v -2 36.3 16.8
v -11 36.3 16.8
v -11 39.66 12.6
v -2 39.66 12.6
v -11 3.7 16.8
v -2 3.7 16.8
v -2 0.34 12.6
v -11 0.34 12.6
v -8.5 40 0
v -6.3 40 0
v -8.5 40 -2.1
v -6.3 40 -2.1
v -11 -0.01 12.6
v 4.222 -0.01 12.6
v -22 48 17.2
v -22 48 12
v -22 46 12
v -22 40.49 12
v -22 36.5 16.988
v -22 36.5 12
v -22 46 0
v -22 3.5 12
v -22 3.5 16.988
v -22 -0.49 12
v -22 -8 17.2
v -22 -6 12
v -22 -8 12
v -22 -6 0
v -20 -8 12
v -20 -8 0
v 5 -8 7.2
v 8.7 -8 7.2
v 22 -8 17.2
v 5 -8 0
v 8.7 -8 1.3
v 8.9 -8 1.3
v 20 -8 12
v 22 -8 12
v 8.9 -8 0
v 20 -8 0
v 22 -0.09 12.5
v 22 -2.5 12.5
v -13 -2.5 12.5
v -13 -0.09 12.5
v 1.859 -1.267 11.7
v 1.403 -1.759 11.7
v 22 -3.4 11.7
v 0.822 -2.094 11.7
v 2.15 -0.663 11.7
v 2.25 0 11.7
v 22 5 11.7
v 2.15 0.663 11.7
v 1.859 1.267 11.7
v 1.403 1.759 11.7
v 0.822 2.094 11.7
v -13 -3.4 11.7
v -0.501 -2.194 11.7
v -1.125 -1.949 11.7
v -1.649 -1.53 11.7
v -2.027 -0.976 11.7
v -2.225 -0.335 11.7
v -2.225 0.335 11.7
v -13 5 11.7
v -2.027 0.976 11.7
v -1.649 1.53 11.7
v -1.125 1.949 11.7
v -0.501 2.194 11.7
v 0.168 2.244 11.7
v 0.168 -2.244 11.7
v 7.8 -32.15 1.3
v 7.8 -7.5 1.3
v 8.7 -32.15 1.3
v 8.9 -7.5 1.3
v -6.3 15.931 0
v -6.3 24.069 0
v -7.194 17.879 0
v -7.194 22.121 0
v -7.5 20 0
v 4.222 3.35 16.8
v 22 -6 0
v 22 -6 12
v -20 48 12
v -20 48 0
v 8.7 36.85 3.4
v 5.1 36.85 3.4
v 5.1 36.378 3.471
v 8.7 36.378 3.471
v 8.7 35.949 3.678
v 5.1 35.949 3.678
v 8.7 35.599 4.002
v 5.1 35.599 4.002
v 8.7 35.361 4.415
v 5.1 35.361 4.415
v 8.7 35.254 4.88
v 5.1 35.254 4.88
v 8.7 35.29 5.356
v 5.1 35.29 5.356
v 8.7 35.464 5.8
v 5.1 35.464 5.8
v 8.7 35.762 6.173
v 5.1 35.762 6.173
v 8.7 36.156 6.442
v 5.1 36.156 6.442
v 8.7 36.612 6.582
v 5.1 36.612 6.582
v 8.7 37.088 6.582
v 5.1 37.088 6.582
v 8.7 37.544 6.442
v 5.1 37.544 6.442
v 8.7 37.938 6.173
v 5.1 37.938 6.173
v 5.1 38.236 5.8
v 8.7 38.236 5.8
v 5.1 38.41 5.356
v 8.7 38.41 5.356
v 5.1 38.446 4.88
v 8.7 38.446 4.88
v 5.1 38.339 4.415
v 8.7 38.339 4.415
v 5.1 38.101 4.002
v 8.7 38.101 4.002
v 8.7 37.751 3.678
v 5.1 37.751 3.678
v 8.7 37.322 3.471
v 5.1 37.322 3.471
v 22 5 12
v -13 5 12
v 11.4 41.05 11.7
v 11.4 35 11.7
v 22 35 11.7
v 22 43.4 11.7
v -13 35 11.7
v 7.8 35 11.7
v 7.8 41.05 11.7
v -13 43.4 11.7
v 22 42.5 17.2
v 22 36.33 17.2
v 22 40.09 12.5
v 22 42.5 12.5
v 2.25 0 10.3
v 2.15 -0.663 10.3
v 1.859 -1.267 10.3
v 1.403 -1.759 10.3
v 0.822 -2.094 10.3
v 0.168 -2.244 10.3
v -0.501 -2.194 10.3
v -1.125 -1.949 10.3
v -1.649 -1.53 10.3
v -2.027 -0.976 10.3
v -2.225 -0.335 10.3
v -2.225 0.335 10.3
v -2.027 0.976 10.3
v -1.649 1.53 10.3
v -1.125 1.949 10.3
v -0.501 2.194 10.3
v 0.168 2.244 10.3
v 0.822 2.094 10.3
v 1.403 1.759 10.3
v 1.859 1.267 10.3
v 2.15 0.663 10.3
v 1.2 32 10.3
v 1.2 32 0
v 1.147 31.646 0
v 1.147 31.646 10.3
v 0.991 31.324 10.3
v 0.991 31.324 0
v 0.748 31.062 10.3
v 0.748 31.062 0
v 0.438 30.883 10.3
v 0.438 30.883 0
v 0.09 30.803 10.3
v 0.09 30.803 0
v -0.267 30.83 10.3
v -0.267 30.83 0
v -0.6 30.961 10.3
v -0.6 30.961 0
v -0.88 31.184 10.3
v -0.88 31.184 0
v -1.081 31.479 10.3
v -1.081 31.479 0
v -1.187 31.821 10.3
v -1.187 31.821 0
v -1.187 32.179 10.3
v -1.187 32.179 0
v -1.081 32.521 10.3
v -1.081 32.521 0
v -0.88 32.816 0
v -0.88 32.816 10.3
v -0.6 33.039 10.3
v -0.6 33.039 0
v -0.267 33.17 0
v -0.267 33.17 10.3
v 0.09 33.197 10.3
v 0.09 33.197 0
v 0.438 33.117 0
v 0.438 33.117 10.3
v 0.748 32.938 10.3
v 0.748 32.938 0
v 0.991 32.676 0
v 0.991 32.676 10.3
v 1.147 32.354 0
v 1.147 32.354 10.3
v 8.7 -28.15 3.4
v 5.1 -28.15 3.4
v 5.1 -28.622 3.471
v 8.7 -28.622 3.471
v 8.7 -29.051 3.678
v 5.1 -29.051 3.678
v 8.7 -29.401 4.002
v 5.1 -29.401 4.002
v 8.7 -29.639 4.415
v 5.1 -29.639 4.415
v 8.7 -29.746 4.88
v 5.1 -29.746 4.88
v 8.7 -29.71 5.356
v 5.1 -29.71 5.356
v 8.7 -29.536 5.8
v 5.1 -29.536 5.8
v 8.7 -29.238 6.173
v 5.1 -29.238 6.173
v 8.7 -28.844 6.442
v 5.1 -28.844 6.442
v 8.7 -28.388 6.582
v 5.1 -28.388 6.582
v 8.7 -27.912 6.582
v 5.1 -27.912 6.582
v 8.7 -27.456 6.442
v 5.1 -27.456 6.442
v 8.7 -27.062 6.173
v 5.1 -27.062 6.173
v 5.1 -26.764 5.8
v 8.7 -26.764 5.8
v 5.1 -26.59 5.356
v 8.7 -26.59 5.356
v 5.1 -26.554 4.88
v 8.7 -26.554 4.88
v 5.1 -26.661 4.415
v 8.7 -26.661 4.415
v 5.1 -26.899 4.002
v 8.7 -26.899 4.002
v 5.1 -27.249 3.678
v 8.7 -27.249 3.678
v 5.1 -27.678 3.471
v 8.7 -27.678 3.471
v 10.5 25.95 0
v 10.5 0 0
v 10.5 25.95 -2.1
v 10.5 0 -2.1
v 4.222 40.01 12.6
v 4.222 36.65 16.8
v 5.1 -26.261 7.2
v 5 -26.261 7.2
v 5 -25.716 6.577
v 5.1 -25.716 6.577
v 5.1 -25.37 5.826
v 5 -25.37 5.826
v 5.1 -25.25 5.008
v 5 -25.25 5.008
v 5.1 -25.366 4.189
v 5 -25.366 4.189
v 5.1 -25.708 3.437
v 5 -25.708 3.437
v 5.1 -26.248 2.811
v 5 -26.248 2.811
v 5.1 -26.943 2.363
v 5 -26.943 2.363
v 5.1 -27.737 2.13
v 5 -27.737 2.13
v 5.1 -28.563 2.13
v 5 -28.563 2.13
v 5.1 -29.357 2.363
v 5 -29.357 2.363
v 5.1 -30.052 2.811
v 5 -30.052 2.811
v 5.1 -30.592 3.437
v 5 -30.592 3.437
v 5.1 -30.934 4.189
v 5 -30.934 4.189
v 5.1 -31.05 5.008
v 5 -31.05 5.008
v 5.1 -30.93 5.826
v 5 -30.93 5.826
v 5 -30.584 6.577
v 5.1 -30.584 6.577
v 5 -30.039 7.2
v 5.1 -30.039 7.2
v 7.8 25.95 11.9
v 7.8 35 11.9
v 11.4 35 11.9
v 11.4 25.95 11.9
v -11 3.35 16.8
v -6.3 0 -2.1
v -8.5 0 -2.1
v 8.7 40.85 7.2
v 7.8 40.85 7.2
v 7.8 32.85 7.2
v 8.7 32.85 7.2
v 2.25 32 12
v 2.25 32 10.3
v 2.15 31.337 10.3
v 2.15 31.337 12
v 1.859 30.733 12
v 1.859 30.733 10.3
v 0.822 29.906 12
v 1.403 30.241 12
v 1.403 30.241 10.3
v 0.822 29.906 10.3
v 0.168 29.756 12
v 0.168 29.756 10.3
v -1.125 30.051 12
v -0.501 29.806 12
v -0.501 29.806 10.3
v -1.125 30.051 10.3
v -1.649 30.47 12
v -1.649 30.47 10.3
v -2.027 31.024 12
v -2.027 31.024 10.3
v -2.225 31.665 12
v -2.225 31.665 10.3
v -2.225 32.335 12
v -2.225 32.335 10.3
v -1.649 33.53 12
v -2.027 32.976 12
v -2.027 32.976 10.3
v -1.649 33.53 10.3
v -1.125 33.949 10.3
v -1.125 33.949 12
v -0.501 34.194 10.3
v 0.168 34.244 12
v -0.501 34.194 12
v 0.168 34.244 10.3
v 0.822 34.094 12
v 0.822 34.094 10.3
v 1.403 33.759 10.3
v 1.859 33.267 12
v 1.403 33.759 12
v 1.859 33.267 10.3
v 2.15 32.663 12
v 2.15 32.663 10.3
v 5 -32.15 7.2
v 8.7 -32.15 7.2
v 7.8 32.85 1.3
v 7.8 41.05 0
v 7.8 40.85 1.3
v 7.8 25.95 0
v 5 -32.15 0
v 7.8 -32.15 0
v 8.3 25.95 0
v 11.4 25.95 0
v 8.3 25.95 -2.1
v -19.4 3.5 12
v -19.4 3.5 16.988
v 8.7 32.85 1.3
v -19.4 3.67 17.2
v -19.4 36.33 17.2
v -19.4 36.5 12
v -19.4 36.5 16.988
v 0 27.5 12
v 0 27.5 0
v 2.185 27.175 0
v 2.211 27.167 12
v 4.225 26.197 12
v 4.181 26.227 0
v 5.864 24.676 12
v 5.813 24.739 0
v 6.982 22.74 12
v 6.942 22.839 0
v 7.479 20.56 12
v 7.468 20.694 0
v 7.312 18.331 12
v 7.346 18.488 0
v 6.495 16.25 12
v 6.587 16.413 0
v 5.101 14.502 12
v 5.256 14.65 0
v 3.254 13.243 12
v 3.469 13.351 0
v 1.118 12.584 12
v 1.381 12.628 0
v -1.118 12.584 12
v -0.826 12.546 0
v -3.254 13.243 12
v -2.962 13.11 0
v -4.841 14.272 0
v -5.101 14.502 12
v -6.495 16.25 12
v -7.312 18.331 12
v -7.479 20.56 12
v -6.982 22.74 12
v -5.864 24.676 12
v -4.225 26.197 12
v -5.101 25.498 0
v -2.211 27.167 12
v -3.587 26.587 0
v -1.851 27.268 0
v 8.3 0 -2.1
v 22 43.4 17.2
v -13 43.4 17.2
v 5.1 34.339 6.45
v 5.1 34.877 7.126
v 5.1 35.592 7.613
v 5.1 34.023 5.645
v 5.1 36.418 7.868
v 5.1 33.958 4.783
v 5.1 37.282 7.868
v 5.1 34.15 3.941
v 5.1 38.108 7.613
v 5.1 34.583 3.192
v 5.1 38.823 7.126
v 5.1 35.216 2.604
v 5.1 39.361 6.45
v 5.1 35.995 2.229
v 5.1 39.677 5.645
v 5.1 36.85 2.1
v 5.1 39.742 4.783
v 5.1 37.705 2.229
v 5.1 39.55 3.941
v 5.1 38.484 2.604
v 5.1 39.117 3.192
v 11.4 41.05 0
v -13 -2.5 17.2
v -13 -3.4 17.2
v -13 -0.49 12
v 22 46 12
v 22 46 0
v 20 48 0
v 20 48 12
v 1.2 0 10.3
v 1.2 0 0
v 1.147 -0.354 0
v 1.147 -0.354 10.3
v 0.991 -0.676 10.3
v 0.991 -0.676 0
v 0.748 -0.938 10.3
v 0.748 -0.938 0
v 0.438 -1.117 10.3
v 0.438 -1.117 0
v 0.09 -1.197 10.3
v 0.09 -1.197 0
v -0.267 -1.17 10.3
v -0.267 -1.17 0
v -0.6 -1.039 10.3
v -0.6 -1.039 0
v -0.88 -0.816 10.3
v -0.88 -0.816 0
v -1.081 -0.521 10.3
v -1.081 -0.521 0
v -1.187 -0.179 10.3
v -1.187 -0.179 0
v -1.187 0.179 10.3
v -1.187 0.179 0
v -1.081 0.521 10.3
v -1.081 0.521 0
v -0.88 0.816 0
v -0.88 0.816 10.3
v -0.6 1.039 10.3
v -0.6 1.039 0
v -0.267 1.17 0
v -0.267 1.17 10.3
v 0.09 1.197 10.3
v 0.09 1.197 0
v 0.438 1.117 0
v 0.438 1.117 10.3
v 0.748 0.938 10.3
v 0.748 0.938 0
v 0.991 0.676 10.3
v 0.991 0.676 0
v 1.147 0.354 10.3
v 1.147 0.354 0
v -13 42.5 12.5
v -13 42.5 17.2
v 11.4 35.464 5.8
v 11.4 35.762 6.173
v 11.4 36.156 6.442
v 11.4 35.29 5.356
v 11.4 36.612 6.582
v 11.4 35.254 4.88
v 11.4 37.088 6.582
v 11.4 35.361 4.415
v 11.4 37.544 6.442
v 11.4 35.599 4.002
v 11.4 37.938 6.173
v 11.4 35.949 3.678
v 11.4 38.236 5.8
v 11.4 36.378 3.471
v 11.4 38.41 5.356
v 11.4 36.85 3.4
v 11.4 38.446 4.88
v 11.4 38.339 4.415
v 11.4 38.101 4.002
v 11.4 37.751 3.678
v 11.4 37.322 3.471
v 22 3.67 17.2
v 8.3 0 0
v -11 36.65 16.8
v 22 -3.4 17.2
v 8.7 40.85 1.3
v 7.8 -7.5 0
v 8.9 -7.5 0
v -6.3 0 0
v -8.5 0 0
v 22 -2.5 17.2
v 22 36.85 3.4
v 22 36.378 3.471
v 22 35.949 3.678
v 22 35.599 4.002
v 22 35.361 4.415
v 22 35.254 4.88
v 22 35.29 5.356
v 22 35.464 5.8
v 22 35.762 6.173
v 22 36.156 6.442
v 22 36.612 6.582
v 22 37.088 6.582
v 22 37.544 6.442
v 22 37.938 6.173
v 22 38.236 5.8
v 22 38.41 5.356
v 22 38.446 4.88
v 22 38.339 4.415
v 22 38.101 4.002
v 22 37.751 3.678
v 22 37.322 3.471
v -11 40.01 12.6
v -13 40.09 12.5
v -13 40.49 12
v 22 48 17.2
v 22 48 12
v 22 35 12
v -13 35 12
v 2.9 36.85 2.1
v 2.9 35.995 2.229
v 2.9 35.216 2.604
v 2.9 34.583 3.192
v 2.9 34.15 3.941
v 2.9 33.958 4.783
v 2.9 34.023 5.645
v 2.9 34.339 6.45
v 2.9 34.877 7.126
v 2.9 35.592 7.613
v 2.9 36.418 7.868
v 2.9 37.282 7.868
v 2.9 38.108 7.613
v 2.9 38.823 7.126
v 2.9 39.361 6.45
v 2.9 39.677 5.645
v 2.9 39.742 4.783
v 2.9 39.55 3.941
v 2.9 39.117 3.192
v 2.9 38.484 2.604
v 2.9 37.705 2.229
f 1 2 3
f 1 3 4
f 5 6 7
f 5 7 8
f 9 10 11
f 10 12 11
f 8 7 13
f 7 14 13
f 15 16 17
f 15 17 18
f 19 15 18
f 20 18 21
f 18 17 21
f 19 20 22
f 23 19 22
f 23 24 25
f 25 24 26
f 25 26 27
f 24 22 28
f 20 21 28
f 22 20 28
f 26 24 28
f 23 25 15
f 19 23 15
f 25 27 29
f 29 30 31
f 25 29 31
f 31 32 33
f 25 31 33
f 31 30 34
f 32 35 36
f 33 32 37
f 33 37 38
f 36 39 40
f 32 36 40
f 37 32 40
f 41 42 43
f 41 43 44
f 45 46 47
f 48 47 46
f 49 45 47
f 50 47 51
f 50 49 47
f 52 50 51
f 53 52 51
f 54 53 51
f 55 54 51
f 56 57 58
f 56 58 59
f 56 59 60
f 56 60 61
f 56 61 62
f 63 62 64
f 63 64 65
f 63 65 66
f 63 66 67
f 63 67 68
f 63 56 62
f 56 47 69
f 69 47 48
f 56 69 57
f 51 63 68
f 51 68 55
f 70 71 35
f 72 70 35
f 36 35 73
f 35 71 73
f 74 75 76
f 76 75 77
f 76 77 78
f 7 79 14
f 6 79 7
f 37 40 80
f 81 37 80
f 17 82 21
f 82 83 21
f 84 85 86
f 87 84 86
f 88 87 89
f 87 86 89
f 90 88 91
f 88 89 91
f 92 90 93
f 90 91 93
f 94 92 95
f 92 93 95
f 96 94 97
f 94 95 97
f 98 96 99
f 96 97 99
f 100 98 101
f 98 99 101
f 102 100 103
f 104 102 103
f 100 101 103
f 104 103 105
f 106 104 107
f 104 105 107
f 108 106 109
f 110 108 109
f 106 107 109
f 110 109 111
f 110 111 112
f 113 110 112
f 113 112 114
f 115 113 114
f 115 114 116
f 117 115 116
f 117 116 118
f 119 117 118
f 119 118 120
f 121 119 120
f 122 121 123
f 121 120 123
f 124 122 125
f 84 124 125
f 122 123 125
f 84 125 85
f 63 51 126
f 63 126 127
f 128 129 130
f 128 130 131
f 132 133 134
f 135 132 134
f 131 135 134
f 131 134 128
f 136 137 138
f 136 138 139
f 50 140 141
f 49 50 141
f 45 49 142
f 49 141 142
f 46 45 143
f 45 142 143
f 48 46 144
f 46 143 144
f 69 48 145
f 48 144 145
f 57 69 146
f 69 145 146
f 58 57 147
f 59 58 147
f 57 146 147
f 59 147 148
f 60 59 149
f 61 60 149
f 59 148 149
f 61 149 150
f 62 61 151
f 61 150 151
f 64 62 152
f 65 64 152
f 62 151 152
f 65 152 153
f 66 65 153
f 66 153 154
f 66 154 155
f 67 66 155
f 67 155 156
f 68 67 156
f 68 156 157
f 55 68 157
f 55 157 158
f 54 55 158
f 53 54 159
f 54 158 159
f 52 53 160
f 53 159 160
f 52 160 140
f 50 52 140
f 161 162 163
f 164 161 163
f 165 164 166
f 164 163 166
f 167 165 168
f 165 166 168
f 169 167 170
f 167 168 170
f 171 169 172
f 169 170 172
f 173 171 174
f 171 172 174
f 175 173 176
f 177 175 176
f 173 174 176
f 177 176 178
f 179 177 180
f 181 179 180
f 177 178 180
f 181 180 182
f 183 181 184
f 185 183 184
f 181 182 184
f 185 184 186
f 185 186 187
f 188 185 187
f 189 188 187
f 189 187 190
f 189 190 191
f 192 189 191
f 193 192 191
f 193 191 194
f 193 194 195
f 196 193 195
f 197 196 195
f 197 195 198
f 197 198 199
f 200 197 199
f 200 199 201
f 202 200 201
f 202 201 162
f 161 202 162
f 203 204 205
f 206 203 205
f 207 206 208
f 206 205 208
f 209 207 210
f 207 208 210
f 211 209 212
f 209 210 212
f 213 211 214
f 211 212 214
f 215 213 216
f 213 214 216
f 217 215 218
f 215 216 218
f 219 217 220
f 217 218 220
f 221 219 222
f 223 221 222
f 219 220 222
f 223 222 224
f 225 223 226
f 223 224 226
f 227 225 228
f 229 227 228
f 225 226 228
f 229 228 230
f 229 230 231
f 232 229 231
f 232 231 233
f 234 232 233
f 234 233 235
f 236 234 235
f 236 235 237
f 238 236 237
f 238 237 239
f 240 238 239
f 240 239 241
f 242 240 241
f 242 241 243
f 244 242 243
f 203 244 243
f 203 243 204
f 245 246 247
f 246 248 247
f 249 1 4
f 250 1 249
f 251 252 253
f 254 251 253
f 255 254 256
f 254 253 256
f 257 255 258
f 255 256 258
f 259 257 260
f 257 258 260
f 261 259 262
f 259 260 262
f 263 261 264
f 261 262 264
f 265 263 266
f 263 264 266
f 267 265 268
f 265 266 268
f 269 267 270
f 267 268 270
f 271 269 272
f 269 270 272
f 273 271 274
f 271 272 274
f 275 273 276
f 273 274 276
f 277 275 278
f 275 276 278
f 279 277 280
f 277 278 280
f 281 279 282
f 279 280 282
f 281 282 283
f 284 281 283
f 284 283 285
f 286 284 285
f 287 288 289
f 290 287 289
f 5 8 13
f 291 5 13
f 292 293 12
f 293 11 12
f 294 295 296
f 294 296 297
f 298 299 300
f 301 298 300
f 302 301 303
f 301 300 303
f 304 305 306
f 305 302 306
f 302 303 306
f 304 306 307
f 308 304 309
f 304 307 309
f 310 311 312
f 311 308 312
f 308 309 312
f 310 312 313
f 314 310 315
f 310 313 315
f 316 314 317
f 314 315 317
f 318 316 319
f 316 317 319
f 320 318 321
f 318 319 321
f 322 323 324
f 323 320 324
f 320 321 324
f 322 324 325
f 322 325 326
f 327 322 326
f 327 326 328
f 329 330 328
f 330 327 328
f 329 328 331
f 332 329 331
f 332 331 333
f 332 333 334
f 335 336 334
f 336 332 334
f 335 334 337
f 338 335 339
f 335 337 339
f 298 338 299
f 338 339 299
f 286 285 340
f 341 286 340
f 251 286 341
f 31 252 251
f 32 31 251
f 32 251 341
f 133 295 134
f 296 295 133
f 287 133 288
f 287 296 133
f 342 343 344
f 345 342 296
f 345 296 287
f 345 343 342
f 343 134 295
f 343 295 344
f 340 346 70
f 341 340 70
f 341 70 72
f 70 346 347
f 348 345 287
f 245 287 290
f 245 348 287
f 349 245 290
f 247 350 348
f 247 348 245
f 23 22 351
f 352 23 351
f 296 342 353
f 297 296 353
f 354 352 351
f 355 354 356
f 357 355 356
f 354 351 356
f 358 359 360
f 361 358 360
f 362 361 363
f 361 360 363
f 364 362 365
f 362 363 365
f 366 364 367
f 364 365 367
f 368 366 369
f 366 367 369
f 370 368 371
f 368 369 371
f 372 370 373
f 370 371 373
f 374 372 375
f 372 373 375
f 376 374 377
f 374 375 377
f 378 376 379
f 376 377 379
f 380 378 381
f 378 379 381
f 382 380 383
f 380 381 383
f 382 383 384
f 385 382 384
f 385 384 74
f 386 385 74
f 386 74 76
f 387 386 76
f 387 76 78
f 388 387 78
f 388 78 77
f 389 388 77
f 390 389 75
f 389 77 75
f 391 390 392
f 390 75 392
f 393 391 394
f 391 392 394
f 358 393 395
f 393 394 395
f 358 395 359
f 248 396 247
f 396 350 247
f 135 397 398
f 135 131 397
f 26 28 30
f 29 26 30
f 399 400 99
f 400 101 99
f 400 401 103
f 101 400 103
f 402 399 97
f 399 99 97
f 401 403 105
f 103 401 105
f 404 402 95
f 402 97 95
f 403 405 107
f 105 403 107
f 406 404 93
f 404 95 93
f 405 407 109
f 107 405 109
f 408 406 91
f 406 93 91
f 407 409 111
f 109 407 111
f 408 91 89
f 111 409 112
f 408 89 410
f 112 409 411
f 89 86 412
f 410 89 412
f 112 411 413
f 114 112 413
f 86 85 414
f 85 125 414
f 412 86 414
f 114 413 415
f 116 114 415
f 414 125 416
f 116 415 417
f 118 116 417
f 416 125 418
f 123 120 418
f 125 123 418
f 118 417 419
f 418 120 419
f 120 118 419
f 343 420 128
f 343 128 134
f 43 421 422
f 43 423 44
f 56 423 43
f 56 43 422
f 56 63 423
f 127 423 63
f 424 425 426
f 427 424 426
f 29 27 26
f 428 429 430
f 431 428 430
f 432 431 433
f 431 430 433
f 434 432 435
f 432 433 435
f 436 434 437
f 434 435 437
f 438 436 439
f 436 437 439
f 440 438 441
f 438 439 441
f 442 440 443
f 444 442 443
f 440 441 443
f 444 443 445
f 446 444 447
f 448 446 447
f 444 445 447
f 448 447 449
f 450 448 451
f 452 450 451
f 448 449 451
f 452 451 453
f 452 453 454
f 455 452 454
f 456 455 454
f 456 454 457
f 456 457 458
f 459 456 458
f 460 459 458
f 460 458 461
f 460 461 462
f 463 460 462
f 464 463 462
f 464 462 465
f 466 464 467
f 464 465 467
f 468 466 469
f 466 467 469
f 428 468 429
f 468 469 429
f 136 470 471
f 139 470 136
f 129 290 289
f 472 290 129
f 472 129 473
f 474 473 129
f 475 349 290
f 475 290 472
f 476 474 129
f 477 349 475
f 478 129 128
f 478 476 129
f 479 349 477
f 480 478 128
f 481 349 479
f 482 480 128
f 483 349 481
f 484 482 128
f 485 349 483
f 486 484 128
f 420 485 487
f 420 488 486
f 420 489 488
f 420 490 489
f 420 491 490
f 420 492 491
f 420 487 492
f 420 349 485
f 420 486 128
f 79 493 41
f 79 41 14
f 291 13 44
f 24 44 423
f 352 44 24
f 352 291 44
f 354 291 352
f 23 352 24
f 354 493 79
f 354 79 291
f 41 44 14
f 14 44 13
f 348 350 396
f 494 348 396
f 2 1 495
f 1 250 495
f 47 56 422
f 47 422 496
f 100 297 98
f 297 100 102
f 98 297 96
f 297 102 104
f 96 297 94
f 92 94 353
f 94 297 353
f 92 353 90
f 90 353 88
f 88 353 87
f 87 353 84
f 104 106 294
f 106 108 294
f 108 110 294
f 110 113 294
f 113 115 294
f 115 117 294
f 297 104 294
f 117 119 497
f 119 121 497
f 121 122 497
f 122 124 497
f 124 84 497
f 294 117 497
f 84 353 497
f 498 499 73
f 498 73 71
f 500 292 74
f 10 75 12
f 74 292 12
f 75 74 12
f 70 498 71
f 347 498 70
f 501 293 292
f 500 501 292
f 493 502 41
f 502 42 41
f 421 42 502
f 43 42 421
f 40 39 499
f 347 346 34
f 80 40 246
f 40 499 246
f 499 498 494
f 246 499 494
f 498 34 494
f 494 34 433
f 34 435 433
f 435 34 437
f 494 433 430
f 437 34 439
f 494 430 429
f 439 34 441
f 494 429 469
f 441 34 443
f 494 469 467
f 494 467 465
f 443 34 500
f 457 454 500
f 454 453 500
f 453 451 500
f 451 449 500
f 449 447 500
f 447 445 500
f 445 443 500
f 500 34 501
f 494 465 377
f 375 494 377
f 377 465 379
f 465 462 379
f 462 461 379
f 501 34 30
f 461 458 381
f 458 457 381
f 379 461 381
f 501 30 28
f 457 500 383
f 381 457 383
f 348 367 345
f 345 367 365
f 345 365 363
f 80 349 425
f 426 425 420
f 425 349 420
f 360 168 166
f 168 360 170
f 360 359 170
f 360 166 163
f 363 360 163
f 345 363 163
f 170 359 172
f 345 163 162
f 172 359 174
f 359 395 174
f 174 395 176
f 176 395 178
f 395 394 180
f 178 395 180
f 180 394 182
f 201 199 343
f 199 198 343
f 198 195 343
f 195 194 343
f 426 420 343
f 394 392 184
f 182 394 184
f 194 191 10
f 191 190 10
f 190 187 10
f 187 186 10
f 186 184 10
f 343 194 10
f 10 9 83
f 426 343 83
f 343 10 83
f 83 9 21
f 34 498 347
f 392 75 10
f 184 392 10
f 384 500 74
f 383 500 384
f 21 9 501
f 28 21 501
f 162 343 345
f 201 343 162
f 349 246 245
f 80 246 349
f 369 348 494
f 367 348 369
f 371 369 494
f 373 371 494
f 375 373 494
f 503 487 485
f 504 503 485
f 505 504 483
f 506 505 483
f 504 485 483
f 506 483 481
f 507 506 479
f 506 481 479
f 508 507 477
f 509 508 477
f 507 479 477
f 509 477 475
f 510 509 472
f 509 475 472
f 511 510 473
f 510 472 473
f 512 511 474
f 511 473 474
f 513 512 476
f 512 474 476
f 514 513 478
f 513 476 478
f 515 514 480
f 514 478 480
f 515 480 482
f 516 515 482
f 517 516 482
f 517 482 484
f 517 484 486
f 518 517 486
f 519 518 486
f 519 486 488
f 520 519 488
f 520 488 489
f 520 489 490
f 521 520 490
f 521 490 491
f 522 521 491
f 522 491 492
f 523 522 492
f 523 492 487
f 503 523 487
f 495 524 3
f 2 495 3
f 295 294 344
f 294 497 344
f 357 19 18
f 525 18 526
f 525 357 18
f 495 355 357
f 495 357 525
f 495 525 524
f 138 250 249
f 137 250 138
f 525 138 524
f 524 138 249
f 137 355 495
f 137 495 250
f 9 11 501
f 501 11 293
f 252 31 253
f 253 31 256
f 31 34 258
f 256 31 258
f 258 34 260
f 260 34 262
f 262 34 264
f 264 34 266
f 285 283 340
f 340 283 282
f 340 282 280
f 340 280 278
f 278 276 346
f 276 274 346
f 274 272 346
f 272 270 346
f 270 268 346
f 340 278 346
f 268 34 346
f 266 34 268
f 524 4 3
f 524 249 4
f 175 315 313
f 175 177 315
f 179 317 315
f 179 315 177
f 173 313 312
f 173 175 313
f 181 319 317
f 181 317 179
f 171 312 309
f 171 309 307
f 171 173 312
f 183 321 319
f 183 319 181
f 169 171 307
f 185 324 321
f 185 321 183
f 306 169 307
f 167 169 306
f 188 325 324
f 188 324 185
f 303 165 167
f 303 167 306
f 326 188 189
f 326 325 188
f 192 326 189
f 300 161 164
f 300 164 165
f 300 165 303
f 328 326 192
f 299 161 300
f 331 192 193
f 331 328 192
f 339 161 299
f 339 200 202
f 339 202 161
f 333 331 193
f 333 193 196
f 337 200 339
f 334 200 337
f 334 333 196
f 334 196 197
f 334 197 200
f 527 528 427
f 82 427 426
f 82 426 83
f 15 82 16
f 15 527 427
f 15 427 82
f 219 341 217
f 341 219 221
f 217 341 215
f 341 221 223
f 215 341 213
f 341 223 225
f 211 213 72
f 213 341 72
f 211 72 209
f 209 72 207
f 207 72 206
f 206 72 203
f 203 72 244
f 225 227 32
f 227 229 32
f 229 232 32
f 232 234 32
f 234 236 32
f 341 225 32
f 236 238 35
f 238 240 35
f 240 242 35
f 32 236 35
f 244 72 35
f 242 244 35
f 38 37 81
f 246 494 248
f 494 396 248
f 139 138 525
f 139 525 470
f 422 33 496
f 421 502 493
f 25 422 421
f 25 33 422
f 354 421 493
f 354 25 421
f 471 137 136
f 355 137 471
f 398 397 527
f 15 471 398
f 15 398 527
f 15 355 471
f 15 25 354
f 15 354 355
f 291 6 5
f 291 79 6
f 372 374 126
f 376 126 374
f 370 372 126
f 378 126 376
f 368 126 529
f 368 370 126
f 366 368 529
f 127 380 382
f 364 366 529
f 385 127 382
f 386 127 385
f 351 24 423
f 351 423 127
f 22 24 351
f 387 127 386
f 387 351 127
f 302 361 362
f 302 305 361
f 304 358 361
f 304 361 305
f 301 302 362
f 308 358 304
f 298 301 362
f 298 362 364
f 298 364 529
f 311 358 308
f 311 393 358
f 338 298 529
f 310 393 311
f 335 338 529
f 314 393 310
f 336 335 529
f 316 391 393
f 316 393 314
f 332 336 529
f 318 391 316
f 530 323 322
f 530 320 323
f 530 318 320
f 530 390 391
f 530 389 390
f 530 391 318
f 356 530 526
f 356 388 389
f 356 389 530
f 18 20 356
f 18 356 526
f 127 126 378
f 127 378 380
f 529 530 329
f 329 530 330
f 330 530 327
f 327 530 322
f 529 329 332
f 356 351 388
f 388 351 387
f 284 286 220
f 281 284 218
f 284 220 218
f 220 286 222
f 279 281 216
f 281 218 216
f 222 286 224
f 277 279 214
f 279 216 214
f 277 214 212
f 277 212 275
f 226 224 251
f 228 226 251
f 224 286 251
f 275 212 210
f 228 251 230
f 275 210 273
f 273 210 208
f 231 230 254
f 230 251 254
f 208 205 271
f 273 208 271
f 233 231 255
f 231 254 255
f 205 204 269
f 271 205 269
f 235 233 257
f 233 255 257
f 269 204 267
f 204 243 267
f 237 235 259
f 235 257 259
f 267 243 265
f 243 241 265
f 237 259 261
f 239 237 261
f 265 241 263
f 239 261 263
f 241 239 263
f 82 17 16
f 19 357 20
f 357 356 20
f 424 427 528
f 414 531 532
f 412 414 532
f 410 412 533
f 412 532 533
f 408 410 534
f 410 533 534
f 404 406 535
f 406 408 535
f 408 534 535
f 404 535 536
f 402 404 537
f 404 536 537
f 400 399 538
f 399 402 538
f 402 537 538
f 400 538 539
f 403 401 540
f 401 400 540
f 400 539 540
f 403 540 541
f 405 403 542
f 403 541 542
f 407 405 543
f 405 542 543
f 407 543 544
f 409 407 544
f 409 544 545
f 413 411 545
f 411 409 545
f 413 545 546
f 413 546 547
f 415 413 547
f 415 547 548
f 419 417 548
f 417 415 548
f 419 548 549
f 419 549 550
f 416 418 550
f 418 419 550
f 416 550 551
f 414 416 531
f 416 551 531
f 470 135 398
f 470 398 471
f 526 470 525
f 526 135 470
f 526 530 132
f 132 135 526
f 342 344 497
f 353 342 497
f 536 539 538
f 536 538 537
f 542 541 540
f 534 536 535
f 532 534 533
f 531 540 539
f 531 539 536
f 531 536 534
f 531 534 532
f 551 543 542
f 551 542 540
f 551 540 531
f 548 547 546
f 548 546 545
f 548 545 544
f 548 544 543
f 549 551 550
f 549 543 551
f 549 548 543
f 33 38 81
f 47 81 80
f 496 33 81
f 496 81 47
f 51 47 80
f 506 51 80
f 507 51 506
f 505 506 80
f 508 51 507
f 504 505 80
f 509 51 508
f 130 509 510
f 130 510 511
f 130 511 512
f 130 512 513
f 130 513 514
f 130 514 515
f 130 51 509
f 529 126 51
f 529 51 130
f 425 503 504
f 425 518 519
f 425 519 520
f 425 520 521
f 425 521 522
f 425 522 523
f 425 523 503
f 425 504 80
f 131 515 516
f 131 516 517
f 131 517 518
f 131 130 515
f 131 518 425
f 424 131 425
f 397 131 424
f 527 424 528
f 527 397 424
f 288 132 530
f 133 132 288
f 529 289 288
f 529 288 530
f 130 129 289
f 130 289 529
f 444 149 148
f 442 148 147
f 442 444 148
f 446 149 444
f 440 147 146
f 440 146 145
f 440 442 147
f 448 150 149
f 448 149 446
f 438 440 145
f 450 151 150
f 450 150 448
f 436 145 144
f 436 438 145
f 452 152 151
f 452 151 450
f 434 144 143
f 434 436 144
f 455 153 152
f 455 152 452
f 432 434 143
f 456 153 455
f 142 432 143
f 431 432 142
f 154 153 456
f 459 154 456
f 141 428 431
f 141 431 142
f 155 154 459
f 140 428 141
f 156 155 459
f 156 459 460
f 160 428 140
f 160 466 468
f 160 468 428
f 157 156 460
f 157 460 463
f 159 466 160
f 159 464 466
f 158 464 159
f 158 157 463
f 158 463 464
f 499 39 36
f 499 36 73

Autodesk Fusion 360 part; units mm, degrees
ref_plane "工作平面1" through (0, 0, 0) normal (0, 0, 1) x (1, 0, 0)
sketch "草图1" plane through (0, 0, 0) normal (0, 0, 1) x (1, 0, 0)
  line L0 (-26, -22) -> (26, -22)
  line L1 (26, -22) -> (28, -20)
  line L2 (28, -20) -> (28, 20)
  line L3 (28, 20) -> (26, 22)
  line L4 (26, 22) -> (-26, 22)
  line L5 (-26, 22) -> (-28, 20)
  line L6 (-28, 20) -> (-28, -20)
  line L7 (-28, -20) -> (-26, -22)
extrude "56 x 44 x 7 platform" add sketch "草图1" along normal blind 12
ref_plane "工作平面2" through (0, 0, 12) normal (0, 0, 1) x (1, 0, 0)
sketch "草图2" plane through (0, 0, 12) normal (0, 0, 1) x (1, 0, 0)
  line L0 (-28, -22) -> (-20.49, -22)
  line L1 (-20.49, -22) -> (-20.49, 22)
  line L2 (-20.49, 22) -> (-28, 22)
  line L3 (-28, 22) -> (-28, -22)
ref_plane "工作平面3" through (0, 0, 17.2) normal (0, 0, 1) x (1, 0, 0)
sketch "草图3" plane through (0, 0, 17.2) normal (0, 0, 1) x (1, 0, 0)
  line L0 (-28, -22) -> (-16.33, -22)
  line L1 (-16.33, -22) -> (-16.33, 22)
  line L2 (-16.33, 22) -> (-28, 22)
  line L3 (-28, 22) -> (-28, -22)
loft "Dovetail retaining rail 0.8 to 1 -1" add profiles "草图2", "草图3" section 1 section 2
ref_plane "工作平面4" through (0, 0, 11.7) normal (0, 0, 1) x (1, 0, 0)
sketch "草图4" plane through (0, 0, 11.7) normal (0, 0, 1) x (1, 0, 0)
  line L0 (-23.4, -22) -> (-22.5, -22)
  line L1 (-22.5, -22) -> (-22.5, 13)
  line L2 (-22.5, 13) -> (-23.4, 13)
  line L3 (-23.4, 13) -> (-23.4, -22)
extrude "0.9 mm longitudinal flexure slot -1" cut sketch "草图4" along normal blind 5.8
ref_plane "工作平面5" through (0, 0, 11.7) normal (0, 0, 1) x (1, 0, 0)
sketch "草图5" plane through (0, 0, 11.7) normal (0, 0, 1) x (1, 0, 0)
  line L0 (-22.5, -22) -> (-15, -22)
  line L1 (-15, -22) -> (-15, 13)
  line L2 (-15, 13) -> (-22.5, 13)
  line L3 (-22.5, 13) -> (-22.5, -22)
extrude "0.8 mm flexure underside relief -1" cut sketch "草图5" along normal blind 0.8
ref_plane "工作平面6" through (0, 0, 12.6) normal (0, 0, 1) x (1, 0, 0)
sketch "草图6" plane through (0, 0, 12.6) normal (0, 0, 1) x (1, 0, 0)
  line L0 (-20.21, -6) -> (-20.21, 11)
  line L1 (-20.21, 11) -> (-19.66, 11)
  line L2 (-19.66, 11) -> (-19.66, 2)
  line L3 (-19.66, 2) -> (-20.11, -6)
  line L4 (-20.11, -6) -> (-20.21, -6)
ref_plane "工作平面7" through (0, 0, 16.8) normal (0, 0, 1) x (1, 0, 0)
sketch "草图7" plane through (0, 0, 16.8) normal (0, 0, 1) x (1, 0, 0)
  line L0 (-16.85, -6) -> (-16.85, 11)
  line L1 (-16.85, 11) -> (-16.3, 11)
  line L2 (-16.3, 11) -> (-16.3, 2)
  line L3 (-16.3, 2) -> (-16.75, -6)
  line L4 (-16.75, -6) -> (-16.85, -6)
loft "Tapered friction contact rib -1" add profiles "草图6", "草图7" section 1 section 2
ref_plane "工作平面8" through (0, 0, 12) normal (0, 0, 1) x (1, 0, 0)
sketch "草图8" plane through (0, 0, 12) normal (0, 0, 1) x (1, 0, 0)
  line L0 (20.49, -22) -> (28, -22)
  line L1 (28, -22) -> (28, 22)
  line L2 (28, 22) -> (20.49, 22)
  line L3 (20.49, 22) -> (20.49, -22)
ref_plane "工作平面9" through (0, 0, 17.2) normal (0, 0, 1) x (1, 0, 0)
sketch "草图9" plane through (0, 0, 17.2) normal (0, 0, 1) x (1, 0, 0)
  line L0 (16.33, -22) -> (28, -22)
  line L1 (28, -22) -> (28, 22)
  line L2 (28, 22) -> (16.33, 22)
  line L3 (16.33, 22) -> (16.33, -22)
loft "Dovetail retaining rail 0.8 to 1 1" add profiles "草图8", "草图9" section 1 section 2
ref_plane "工作平面10" through (0, 0, 11.7) normal (0, 0, 1) x (1, 0, 0)
sketch "草图10" plane through (0, 0, 11.7) normal (0, 0, 1) x (1, 0, 0)
  line L0 (22.5, -22) -> (23.4, -22)
  line L1 (23.4, -22) -> (23.4, 13)
  line L2 (23.4, 13) -> (22.5, 13)
  line L3 (22.5, 13) -> (22.5, -22)
extrude "0.9 mm longitudinal flexure slot 1" cut sketch "草图10" along normal blind 5.8
ref_plane "工作平面11" through (0, 0, 11.7) normal (0, 0, 1) x (1, 0, 0)
sketch "草图11" plane through (0, 0, 11.7) normal (0, 0, 1) x (1, 0, 0)
  line L0 (15, -22) -> (22.5, -22)
  line L1 (22.5, -22) -> (22.5, 13)
  line L2 (22.5, 13) -> (15, 13)
  line L3 (15, 13) -> (15, -22)
extrude "0.8 mm flexure underside relief 1" cut sketch "草图11" along normal blind 0.8
ref_plane "工作平面12" through (0, 0, 12.6) normal (0, 0, 1) x (1, 0, 0)
sketch "草图12" plane through (0, 0, 12.6) normal (0, 0, 1) x (1, 0, 0)
  line L0 (20.21, -6) -> (20.21, 11)
  line L1 (20.21, 11) -> (19.66, 11)
  line L2 (19.66, 11) -> (19.66, 2)
  line L3 (19.66, 2) -> (20.11, -6)
  line L4 (20.11, -6) -> (20.21, -6)
ref_plane "工作平面13" through (0, 0, 16.8) normal (0, 0, 1) x (1, 0, 0)
sketch "草图13" plane through (0, 0, 16.8) normal (0, 0, 1) x (1, 0, 0)
  line L0 (16.85, -6) -> (16.85, 11)
  line L1 (16.85, 11) -> (16.3, 11)
  line L2 (16.3, 11) -> (16.3, 2)
  line L3 (16.3, 2) -> (16.75, -6)
  line L4 (16.75, -6) -> (16.85, -6)
loft "Tapered friction contact rib 1" add profiles "草图12", "草图13" section 1 section 2
ref_plane "工作平面14" through (0, 0, 12) normal (0, 0, 1) x (1, 0, 0)
sketch "草图14" plane through (0, 0, 12) normal (0, 0, 1) x (1, 0, 0)
  line L0 (-16.5, 19.4) -> (16.5, 19.4)
  line L1 (16.5, 19.4) -> (16.5, 22)
  line L2 (16.5, 22) -> (-16.5, 22)
  line L3 (-16.5, 22) -> (-16.5, 19.4)
extrude "Closed insertion end stop" add sketch "草图14" along normal blind 5.2
ref_plane "工作平面15" through (0, 0, 0) normal (0, 0, 1) x (1, 0, 0)
sketch "草图15" plane through (0, 0, 0) normal (0, 0, 1) x (1, 0, 0)
  circle A0 centre (0, 0) radius 7.5
extrude "15 mm screw and driver access" cut sketch "草图15" along normal blind 12
move_body "Align camera long edge with gimbal arm - 90 degrees" bodies 1 to x (0, 1, 0) y (-1, 0, 0) z (0, 0, 1) at (0, 0, 0)
ref_plane "工作平面16" through (0, 0, 0) normal (0, 0, 1) x (1, 0, 0)
sketch "草图16" plane through (0, 0, 0) normal (0, 0, 1) x (1, 0, 0)
  line L0 (7.8, 5.95) -> (11.4, 5.95)
  line L1 (11.4, 5.95) -> (11.4, 21.05)
  line L2 (11.4, 21.05) -> (7.8, 21.05)
  line L3 (7.8, 21.05) -> (7.8, 5.95)
extrude "Clear original raised tab and root fillet" cut sketch "草图16" along normal blind 11.9
ref_plane "工作平面17" through (0, 0, -2.1) normal (0, 0, 1) x (1, 0, 0)
sketch "草图17" plane through (0, 0, -2.1) normal (0, 0, 1) x (1, 0, 0)
  line L0 (-8.5, -20) -> (-6.3, -20)
  line L1 (-6.3, -20) -> (-6.3, 20)
  line L2 (-6.3, 20) -> (-8.5, 20)
  line L3 (-8.5, 20) -> (-8.5, -20)
extrude "Arm lateral locating shoulder" add sketch "草图17" along normal blind 2.1
ref_plane "工作平面18" through (0, 0, -2.1) normal (0, 0, 1) x (1, 0, 0)
sketch "草图18" plane through (0, 0, -2.1) normal (0, 0, 1) x (1, 0, 0)
  line L0 (8.3, -20) -> (10.5, -20)
  line L1 (10.5, -20) -> (10.5, 20)
  line L2 (10.5, 20) -> (8.3, 20)
  line L3 (8.3, 20) -> (8.3, -20)
extrude "Arm lateral locating shoulder (1)" add sketch "草图18" along normal blind 2.1
ref_plane "工作平面19" through (0, 0, 0) normal (0, 0, 1) x (1, 0, 0)
sketch "草图19" plane through (0, 0, 0) normal (0, 0, 1) x (1, 0, 0)
  circle A0 centre (0, -20) radius 1.2
extrude "M2 through clearance at y -20.0" cut sketch "草图19" along normal blind 12
ref_plane "工作平面20" through (0, 0, 10.3) normal (0, 0, 1) x (1, 0, 0)
sketch "草图20" plane through (0, 0, 10.3) normal (0, 0, 1) x (1, 0, 0)
  circle A0 centre (0, -20) radius 2.25
extrude "M2 head recess at y -20.0" cut sketch "草图20" along normal blind 1.7
ref_plane "工作平面21" through (0, 0, 0) normal (0, 0, 1) x (1, 0, 0)
sketch "草图21" plane through (0, 0, 0) normal (0, 0, 1) x (1, 0, 0)
  circle A0 centre (0, 12) radius 1.2
extrude "M2 through clearance at y 12.0" cut sketch "草图21" along normal blind 12
ref_plane "工作平面22" through (0, 0, 10.3) normal (0, 0, 1) x (1, 0, 0)
sketch "草图22" plane through (0, 0, 10.3) normal (0, 0, 1) x (1, 0, 0)
  circle A0 centre (0, 12) radius 2.25
extrude "M2 head recess at y 12.0" cut sketch "草图22" along normal blind 1.7
ref_plane "工作平面23" through (0, 0, 0) normal (0, 0, 1) x (1, 0, 0)
sketch "草图23" plane through (0, 0, 0) normal (0, 0, 1) x (1, 0, 0)
  line L0 (5, -52.15) -> (8.7, -52.15)
  line L1 (8.7, -52.15) -> (8.7, -27.5)
  line L2 (8.7, -27.5) -> (5, -27.5)
  line L3 (5, -27.5) -> (5, -52.15)
extrude "Ear for original 3.2 mm side hole at arm y -28.15" add sketch "草图23" along normal blind 7.2
ref_plane "工作平面24" through (0, 0, 0) normal (0, 0, 1) x (1, 0, 0)
sketch "草图24" plane through (0, 0, 0) normal (0, 0, 1) x (1, 0, 0)
  line L0 (7.8, -52.15) -> (8.9, -52.15)
  line L1 (8.9, -52.15) -> (8.9, -27.5)
  line L2 (8.9, -27.5) -> (7.8, -27.5)
  line L3 (7.8, -27.5) -> (7.8, -52.15)
extrude "Ear relief around original arm root radius" cut sketch "草图24" along normal blind 1.3
ref_plane "工作平面25" through (4.9, 0, 0) normal (1, 0, 0) x (0, 1, 0)
sketch "草图25" plane through (4.9, 0, 0) normal (1, 0, 0) x (0, 0, -1)
  circle A0 centre (-5, -48.15) radius 1.6
extrude "Side rivet full passage clearance" cut sketch "草图25" along normal blind 20
ref_plane "工作平面26" through (2.9, 0, 0) normal (1, 0, 0) x (0, 1, 0)
sketch "草图26" plane through (2.9, 0, 0) normal (1, 0, 0) x (0, 0, -1)
  circle A0 centre (-5, -48.15) radius 2.9
extrude "Side rivet flange counterbore" cut sketch "草图26" along normal blind 2.2
ref_plane "工作平面27" through (0, 0, 0) normal (0, 0, 1) x (1, 0, 0)
sketch "草图27" plane through (0, 0, 0) normal (0, 0, 1) x (1, 0, 0)
  line L0 (5, 12.85) -> (8.7, 12.85)
  line L1 (8.7, 12.85) -> (8.7, 20.85)
  line L2 (8.7, 20.85) -> (5, 20.85)
  line L3 (5, 20.85) -> (5, 12.85)
extrude "Ear for original 3.2 mm side hole at arm y 36.85" add sketch "草图27" along normal blind 7.2
ref_plane "工作平面28" through (0, 0, 0) normal (0, 0, 1) x (1, 0, 0)
sketch "草图28" plane through (0, 0, 0) normal (0, 0, 1) x (1, 0, 0)
  line L0 (7.8, 12.85) -> (8.9, 12.85)
  line L1 (8.9, 12.85) -> (8.9, 20.85)
  line L2 (8.9, 20.85) -> (7.8, 20.85)
  line L3 (7.8, 20.85) -> (7.8, 12.85)
extrude "Ear relief around original arm root radius (1)" cut sketch "草图28" along normal blind 1.3
ref_plane "工作平面29" through (4.9, 0, 0) normal (1, 0, 0) x (0, 1, 0)
sketch "草图29" plane through (4.9, 0, 0) normal (1, 0, 0) x (0, 0, -1)
  circle A0 centre (-5, 16.85) radius 1.6
extrude "Side rivet full passage clearance (1)" cut sketch "草图29" along normal blind 20
ref_plane "工作平面30" through (2.9, 0, 0) normal (1, 0, 0) x (0, 1, 0)
sketch "草图30" plane through (2.9, 0, 0) normal (1, 0, 0) x (0, 0, -1)
  circle A0 centre (-5, 16.85) radius 2.9
extrude "Side rivet flange counterbore (1)" cut sketch "草图30" along normal blind 2.2
move_body "Move outward toward free end 20.0 mm" bodies 1 to x (1, 0, 0) y (0, 1, 0) z (0, 0, 1) at (0, 20, 0)
ref_plane "工作平面31" through (0, 0, -2.11) normal (0, 0, 1) x (1, 0, 0)
sketch "草图31" plane through (0, 0, -2.11) normal (0, 0, 1) x (1, 0, 0)
  line L0 (8.29, 25.95) -> (10.51, 25.95)
  line L1 (10.51, 25.95) -> (10.51, 40.05)
  line L2 (10.51, 40.05) -> (8.29, 40.05)
  line L3 (8.29, 40.05) -> (8.29, 25.95)
extrude "Trim locating shoulder before raised side ear root" cut sketch "草图31" along normal blind 2.11
